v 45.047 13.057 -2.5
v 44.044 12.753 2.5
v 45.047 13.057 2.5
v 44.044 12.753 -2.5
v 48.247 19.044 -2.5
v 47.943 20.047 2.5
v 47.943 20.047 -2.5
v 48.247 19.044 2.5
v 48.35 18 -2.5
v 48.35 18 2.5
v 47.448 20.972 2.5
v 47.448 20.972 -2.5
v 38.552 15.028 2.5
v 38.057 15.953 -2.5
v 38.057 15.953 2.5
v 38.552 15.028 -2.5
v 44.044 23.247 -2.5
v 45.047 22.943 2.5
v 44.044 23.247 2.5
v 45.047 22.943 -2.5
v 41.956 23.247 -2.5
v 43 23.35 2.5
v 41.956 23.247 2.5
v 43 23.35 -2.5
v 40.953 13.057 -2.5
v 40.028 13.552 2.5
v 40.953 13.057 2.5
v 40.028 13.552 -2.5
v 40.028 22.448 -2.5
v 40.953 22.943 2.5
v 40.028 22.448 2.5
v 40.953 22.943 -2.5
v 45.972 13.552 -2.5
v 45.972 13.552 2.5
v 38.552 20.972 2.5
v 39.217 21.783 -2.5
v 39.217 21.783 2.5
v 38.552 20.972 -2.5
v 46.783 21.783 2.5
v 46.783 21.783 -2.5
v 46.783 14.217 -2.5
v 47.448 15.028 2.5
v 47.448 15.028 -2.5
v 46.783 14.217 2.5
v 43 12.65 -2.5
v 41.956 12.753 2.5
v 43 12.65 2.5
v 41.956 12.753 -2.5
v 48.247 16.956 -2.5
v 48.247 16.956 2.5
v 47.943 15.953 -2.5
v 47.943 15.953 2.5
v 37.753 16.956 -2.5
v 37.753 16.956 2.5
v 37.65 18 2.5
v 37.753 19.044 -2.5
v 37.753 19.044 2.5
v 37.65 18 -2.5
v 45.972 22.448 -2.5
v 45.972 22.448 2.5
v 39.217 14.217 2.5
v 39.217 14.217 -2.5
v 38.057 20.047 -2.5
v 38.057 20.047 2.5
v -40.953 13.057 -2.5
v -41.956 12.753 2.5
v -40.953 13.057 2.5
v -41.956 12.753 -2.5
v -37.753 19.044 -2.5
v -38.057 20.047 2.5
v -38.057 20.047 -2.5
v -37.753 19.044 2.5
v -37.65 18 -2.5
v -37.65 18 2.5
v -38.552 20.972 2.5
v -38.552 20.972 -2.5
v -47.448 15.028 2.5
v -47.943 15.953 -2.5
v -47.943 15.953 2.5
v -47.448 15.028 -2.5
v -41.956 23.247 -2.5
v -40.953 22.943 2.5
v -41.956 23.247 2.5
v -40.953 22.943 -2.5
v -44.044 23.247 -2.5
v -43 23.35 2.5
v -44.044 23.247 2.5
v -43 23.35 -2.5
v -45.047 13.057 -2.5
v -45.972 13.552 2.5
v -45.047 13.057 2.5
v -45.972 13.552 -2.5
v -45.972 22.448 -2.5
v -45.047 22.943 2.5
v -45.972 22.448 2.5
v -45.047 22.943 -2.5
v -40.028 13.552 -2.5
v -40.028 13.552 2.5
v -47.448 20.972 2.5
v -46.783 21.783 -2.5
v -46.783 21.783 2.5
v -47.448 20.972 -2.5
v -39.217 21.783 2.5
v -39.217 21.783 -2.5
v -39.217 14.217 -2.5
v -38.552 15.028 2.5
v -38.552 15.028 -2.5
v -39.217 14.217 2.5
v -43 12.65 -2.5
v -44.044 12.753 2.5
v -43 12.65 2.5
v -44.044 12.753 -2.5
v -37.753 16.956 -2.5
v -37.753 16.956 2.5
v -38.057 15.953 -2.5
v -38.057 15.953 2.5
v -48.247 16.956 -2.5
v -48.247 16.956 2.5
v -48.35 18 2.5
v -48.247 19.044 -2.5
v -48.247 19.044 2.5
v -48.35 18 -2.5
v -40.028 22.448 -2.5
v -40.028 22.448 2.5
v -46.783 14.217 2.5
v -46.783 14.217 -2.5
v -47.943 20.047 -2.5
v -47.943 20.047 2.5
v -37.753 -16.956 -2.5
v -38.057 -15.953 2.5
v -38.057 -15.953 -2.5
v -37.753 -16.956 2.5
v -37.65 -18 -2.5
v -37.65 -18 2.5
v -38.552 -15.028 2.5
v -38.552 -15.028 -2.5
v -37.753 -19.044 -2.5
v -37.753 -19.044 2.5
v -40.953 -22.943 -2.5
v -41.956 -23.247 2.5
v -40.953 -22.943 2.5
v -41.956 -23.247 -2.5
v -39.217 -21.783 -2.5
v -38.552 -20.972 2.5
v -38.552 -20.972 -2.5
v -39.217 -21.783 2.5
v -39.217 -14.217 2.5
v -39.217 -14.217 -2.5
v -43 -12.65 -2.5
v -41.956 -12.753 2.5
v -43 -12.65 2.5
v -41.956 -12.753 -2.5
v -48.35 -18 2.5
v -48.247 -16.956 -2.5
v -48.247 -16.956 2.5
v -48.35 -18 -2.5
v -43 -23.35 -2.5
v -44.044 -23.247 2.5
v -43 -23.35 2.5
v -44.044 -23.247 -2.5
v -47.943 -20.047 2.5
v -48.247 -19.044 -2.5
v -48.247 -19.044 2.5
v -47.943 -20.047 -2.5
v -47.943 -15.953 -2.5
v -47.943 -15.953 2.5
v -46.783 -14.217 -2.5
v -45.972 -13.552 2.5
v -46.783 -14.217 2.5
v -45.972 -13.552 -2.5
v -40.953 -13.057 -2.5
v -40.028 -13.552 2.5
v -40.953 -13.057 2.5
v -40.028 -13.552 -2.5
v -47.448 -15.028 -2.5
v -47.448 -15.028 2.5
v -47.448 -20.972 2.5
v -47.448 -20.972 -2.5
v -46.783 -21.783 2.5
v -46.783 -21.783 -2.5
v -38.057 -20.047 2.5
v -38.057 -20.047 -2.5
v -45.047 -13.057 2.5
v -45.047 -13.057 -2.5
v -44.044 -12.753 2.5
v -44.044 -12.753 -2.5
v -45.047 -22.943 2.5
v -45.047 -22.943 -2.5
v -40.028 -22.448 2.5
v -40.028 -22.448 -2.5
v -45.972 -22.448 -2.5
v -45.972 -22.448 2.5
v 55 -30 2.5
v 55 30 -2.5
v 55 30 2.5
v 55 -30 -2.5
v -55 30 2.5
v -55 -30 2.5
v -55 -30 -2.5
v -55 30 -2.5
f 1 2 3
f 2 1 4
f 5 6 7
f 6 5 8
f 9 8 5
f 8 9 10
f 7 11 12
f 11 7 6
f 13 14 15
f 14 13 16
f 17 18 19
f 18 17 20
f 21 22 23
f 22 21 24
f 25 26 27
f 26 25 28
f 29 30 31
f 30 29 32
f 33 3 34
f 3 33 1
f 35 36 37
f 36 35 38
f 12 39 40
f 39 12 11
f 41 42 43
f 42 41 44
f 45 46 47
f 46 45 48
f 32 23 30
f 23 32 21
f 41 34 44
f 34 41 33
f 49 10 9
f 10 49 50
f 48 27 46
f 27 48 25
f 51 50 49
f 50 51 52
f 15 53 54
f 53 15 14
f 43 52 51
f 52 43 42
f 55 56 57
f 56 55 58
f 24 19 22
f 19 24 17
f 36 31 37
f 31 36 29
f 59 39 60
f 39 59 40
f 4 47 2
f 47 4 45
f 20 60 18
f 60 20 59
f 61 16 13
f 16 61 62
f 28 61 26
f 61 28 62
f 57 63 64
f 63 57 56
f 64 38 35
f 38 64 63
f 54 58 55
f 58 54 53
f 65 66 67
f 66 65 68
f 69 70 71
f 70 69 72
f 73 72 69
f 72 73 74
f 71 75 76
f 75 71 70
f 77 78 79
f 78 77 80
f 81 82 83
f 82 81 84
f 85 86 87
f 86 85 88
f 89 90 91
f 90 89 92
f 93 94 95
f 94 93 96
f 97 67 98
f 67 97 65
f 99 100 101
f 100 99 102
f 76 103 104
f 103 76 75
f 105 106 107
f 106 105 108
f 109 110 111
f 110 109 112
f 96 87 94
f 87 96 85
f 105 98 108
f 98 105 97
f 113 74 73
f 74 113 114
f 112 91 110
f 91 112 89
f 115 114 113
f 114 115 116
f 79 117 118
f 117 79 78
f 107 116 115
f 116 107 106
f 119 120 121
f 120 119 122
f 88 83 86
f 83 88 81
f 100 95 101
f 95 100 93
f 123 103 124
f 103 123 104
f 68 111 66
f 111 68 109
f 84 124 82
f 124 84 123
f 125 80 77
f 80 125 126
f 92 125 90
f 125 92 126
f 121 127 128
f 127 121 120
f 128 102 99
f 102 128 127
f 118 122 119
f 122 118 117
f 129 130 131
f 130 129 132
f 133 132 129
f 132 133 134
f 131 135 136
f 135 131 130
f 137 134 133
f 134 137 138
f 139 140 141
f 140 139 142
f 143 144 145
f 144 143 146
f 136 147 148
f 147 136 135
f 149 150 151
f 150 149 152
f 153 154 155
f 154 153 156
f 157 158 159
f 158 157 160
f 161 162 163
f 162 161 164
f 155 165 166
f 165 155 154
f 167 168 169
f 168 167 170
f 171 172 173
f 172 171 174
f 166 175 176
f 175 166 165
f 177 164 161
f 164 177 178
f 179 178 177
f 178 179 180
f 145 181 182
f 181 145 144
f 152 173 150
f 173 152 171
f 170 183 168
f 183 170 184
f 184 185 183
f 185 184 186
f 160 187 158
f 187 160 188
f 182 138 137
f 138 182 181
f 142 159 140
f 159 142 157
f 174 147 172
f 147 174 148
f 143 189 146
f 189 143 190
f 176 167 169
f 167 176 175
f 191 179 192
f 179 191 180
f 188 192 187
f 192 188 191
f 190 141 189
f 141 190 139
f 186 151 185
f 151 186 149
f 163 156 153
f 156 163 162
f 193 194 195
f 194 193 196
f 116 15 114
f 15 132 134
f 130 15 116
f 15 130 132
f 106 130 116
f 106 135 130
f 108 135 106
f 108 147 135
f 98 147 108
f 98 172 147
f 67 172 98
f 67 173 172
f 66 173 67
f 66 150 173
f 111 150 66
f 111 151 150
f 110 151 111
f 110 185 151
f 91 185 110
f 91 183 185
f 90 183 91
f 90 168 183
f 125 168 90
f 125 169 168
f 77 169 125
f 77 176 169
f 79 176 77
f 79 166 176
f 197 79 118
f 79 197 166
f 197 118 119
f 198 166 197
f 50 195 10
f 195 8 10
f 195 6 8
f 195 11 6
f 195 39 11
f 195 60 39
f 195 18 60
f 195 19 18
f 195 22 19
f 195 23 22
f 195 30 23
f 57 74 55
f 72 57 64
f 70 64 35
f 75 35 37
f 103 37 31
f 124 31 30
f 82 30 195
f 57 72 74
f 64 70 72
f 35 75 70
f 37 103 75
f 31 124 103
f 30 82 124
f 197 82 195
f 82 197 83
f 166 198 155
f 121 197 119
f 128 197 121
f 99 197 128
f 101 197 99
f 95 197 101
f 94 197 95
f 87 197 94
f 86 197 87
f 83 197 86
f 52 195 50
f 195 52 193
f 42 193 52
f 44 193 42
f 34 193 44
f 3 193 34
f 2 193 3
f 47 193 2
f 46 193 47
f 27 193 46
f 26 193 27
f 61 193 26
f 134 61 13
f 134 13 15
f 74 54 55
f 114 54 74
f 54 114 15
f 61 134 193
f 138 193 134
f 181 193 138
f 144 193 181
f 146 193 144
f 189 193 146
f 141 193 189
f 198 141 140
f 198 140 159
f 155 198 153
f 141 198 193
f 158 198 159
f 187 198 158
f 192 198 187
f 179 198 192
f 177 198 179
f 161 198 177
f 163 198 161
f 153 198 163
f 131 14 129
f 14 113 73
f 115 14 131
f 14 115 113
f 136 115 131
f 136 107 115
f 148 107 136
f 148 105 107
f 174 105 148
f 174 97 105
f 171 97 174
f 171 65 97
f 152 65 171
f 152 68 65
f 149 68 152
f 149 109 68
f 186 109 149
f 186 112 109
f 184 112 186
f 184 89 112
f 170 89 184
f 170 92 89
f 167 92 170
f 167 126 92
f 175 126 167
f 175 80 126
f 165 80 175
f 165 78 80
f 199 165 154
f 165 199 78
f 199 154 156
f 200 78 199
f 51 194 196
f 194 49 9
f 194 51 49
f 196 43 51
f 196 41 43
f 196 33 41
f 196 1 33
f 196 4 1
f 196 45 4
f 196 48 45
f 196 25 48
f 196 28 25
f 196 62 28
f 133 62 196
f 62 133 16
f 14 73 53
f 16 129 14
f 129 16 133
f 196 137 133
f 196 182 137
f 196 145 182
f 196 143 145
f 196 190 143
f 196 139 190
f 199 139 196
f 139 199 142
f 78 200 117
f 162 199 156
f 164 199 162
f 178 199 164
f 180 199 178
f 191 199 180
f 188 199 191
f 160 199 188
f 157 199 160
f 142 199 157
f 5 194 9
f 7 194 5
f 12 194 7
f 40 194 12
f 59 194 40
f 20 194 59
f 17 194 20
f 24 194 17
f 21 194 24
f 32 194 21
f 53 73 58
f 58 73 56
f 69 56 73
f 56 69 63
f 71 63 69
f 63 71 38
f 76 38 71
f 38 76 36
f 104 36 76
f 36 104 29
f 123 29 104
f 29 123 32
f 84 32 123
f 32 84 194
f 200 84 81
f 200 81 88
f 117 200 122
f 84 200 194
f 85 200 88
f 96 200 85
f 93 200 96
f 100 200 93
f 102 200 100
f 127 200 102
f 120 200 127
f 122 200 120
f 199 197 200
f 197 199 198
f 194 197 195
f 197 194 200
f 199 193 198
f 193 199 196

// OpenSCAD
$fn = 32;

// ----------------------------------------------------------------------
// Corner plate 110 x 60 x 5
// 3 holes, centres taken from the edge offset
// ----------------------------------------------------------------------

// --- parameters (mm) ---
plate = [110, 60, 5];   // overall size (x, y, z)
holes = 3;              // number of holes the drawing asks for
bore_d = 10.5;          // nominal hole diameter from the drawing
print_allowance = 0.2;  // clearance added for printing
edge = 12;              // hole centre offset from the plate edge

// --- derived feature positions (mm) ---
hole_d = bore_d + print_allowance;  // = 10.7   hole diameter as printed
corner_x = plate[0] / 2 - edge;     // = 43   corner hole X
corner_y = plate[1] / 2 - edge;     // = 18   corner hole Y
feature_centers = [
  [corner_x, corner_y],
  [-corner_x, corner_y],
  [-corner_x, -corner_y]
];   // hole centres the loop below drills

// plate outline, every hole drilled through with the same cutters
difference() {
  cube(plate, center = true);
  for (centre = feature_centers)
    translate([centre[0], centre[1], 0])
      cylinder(d = hole_d, h = plate[2] + 2, center = true);
}
